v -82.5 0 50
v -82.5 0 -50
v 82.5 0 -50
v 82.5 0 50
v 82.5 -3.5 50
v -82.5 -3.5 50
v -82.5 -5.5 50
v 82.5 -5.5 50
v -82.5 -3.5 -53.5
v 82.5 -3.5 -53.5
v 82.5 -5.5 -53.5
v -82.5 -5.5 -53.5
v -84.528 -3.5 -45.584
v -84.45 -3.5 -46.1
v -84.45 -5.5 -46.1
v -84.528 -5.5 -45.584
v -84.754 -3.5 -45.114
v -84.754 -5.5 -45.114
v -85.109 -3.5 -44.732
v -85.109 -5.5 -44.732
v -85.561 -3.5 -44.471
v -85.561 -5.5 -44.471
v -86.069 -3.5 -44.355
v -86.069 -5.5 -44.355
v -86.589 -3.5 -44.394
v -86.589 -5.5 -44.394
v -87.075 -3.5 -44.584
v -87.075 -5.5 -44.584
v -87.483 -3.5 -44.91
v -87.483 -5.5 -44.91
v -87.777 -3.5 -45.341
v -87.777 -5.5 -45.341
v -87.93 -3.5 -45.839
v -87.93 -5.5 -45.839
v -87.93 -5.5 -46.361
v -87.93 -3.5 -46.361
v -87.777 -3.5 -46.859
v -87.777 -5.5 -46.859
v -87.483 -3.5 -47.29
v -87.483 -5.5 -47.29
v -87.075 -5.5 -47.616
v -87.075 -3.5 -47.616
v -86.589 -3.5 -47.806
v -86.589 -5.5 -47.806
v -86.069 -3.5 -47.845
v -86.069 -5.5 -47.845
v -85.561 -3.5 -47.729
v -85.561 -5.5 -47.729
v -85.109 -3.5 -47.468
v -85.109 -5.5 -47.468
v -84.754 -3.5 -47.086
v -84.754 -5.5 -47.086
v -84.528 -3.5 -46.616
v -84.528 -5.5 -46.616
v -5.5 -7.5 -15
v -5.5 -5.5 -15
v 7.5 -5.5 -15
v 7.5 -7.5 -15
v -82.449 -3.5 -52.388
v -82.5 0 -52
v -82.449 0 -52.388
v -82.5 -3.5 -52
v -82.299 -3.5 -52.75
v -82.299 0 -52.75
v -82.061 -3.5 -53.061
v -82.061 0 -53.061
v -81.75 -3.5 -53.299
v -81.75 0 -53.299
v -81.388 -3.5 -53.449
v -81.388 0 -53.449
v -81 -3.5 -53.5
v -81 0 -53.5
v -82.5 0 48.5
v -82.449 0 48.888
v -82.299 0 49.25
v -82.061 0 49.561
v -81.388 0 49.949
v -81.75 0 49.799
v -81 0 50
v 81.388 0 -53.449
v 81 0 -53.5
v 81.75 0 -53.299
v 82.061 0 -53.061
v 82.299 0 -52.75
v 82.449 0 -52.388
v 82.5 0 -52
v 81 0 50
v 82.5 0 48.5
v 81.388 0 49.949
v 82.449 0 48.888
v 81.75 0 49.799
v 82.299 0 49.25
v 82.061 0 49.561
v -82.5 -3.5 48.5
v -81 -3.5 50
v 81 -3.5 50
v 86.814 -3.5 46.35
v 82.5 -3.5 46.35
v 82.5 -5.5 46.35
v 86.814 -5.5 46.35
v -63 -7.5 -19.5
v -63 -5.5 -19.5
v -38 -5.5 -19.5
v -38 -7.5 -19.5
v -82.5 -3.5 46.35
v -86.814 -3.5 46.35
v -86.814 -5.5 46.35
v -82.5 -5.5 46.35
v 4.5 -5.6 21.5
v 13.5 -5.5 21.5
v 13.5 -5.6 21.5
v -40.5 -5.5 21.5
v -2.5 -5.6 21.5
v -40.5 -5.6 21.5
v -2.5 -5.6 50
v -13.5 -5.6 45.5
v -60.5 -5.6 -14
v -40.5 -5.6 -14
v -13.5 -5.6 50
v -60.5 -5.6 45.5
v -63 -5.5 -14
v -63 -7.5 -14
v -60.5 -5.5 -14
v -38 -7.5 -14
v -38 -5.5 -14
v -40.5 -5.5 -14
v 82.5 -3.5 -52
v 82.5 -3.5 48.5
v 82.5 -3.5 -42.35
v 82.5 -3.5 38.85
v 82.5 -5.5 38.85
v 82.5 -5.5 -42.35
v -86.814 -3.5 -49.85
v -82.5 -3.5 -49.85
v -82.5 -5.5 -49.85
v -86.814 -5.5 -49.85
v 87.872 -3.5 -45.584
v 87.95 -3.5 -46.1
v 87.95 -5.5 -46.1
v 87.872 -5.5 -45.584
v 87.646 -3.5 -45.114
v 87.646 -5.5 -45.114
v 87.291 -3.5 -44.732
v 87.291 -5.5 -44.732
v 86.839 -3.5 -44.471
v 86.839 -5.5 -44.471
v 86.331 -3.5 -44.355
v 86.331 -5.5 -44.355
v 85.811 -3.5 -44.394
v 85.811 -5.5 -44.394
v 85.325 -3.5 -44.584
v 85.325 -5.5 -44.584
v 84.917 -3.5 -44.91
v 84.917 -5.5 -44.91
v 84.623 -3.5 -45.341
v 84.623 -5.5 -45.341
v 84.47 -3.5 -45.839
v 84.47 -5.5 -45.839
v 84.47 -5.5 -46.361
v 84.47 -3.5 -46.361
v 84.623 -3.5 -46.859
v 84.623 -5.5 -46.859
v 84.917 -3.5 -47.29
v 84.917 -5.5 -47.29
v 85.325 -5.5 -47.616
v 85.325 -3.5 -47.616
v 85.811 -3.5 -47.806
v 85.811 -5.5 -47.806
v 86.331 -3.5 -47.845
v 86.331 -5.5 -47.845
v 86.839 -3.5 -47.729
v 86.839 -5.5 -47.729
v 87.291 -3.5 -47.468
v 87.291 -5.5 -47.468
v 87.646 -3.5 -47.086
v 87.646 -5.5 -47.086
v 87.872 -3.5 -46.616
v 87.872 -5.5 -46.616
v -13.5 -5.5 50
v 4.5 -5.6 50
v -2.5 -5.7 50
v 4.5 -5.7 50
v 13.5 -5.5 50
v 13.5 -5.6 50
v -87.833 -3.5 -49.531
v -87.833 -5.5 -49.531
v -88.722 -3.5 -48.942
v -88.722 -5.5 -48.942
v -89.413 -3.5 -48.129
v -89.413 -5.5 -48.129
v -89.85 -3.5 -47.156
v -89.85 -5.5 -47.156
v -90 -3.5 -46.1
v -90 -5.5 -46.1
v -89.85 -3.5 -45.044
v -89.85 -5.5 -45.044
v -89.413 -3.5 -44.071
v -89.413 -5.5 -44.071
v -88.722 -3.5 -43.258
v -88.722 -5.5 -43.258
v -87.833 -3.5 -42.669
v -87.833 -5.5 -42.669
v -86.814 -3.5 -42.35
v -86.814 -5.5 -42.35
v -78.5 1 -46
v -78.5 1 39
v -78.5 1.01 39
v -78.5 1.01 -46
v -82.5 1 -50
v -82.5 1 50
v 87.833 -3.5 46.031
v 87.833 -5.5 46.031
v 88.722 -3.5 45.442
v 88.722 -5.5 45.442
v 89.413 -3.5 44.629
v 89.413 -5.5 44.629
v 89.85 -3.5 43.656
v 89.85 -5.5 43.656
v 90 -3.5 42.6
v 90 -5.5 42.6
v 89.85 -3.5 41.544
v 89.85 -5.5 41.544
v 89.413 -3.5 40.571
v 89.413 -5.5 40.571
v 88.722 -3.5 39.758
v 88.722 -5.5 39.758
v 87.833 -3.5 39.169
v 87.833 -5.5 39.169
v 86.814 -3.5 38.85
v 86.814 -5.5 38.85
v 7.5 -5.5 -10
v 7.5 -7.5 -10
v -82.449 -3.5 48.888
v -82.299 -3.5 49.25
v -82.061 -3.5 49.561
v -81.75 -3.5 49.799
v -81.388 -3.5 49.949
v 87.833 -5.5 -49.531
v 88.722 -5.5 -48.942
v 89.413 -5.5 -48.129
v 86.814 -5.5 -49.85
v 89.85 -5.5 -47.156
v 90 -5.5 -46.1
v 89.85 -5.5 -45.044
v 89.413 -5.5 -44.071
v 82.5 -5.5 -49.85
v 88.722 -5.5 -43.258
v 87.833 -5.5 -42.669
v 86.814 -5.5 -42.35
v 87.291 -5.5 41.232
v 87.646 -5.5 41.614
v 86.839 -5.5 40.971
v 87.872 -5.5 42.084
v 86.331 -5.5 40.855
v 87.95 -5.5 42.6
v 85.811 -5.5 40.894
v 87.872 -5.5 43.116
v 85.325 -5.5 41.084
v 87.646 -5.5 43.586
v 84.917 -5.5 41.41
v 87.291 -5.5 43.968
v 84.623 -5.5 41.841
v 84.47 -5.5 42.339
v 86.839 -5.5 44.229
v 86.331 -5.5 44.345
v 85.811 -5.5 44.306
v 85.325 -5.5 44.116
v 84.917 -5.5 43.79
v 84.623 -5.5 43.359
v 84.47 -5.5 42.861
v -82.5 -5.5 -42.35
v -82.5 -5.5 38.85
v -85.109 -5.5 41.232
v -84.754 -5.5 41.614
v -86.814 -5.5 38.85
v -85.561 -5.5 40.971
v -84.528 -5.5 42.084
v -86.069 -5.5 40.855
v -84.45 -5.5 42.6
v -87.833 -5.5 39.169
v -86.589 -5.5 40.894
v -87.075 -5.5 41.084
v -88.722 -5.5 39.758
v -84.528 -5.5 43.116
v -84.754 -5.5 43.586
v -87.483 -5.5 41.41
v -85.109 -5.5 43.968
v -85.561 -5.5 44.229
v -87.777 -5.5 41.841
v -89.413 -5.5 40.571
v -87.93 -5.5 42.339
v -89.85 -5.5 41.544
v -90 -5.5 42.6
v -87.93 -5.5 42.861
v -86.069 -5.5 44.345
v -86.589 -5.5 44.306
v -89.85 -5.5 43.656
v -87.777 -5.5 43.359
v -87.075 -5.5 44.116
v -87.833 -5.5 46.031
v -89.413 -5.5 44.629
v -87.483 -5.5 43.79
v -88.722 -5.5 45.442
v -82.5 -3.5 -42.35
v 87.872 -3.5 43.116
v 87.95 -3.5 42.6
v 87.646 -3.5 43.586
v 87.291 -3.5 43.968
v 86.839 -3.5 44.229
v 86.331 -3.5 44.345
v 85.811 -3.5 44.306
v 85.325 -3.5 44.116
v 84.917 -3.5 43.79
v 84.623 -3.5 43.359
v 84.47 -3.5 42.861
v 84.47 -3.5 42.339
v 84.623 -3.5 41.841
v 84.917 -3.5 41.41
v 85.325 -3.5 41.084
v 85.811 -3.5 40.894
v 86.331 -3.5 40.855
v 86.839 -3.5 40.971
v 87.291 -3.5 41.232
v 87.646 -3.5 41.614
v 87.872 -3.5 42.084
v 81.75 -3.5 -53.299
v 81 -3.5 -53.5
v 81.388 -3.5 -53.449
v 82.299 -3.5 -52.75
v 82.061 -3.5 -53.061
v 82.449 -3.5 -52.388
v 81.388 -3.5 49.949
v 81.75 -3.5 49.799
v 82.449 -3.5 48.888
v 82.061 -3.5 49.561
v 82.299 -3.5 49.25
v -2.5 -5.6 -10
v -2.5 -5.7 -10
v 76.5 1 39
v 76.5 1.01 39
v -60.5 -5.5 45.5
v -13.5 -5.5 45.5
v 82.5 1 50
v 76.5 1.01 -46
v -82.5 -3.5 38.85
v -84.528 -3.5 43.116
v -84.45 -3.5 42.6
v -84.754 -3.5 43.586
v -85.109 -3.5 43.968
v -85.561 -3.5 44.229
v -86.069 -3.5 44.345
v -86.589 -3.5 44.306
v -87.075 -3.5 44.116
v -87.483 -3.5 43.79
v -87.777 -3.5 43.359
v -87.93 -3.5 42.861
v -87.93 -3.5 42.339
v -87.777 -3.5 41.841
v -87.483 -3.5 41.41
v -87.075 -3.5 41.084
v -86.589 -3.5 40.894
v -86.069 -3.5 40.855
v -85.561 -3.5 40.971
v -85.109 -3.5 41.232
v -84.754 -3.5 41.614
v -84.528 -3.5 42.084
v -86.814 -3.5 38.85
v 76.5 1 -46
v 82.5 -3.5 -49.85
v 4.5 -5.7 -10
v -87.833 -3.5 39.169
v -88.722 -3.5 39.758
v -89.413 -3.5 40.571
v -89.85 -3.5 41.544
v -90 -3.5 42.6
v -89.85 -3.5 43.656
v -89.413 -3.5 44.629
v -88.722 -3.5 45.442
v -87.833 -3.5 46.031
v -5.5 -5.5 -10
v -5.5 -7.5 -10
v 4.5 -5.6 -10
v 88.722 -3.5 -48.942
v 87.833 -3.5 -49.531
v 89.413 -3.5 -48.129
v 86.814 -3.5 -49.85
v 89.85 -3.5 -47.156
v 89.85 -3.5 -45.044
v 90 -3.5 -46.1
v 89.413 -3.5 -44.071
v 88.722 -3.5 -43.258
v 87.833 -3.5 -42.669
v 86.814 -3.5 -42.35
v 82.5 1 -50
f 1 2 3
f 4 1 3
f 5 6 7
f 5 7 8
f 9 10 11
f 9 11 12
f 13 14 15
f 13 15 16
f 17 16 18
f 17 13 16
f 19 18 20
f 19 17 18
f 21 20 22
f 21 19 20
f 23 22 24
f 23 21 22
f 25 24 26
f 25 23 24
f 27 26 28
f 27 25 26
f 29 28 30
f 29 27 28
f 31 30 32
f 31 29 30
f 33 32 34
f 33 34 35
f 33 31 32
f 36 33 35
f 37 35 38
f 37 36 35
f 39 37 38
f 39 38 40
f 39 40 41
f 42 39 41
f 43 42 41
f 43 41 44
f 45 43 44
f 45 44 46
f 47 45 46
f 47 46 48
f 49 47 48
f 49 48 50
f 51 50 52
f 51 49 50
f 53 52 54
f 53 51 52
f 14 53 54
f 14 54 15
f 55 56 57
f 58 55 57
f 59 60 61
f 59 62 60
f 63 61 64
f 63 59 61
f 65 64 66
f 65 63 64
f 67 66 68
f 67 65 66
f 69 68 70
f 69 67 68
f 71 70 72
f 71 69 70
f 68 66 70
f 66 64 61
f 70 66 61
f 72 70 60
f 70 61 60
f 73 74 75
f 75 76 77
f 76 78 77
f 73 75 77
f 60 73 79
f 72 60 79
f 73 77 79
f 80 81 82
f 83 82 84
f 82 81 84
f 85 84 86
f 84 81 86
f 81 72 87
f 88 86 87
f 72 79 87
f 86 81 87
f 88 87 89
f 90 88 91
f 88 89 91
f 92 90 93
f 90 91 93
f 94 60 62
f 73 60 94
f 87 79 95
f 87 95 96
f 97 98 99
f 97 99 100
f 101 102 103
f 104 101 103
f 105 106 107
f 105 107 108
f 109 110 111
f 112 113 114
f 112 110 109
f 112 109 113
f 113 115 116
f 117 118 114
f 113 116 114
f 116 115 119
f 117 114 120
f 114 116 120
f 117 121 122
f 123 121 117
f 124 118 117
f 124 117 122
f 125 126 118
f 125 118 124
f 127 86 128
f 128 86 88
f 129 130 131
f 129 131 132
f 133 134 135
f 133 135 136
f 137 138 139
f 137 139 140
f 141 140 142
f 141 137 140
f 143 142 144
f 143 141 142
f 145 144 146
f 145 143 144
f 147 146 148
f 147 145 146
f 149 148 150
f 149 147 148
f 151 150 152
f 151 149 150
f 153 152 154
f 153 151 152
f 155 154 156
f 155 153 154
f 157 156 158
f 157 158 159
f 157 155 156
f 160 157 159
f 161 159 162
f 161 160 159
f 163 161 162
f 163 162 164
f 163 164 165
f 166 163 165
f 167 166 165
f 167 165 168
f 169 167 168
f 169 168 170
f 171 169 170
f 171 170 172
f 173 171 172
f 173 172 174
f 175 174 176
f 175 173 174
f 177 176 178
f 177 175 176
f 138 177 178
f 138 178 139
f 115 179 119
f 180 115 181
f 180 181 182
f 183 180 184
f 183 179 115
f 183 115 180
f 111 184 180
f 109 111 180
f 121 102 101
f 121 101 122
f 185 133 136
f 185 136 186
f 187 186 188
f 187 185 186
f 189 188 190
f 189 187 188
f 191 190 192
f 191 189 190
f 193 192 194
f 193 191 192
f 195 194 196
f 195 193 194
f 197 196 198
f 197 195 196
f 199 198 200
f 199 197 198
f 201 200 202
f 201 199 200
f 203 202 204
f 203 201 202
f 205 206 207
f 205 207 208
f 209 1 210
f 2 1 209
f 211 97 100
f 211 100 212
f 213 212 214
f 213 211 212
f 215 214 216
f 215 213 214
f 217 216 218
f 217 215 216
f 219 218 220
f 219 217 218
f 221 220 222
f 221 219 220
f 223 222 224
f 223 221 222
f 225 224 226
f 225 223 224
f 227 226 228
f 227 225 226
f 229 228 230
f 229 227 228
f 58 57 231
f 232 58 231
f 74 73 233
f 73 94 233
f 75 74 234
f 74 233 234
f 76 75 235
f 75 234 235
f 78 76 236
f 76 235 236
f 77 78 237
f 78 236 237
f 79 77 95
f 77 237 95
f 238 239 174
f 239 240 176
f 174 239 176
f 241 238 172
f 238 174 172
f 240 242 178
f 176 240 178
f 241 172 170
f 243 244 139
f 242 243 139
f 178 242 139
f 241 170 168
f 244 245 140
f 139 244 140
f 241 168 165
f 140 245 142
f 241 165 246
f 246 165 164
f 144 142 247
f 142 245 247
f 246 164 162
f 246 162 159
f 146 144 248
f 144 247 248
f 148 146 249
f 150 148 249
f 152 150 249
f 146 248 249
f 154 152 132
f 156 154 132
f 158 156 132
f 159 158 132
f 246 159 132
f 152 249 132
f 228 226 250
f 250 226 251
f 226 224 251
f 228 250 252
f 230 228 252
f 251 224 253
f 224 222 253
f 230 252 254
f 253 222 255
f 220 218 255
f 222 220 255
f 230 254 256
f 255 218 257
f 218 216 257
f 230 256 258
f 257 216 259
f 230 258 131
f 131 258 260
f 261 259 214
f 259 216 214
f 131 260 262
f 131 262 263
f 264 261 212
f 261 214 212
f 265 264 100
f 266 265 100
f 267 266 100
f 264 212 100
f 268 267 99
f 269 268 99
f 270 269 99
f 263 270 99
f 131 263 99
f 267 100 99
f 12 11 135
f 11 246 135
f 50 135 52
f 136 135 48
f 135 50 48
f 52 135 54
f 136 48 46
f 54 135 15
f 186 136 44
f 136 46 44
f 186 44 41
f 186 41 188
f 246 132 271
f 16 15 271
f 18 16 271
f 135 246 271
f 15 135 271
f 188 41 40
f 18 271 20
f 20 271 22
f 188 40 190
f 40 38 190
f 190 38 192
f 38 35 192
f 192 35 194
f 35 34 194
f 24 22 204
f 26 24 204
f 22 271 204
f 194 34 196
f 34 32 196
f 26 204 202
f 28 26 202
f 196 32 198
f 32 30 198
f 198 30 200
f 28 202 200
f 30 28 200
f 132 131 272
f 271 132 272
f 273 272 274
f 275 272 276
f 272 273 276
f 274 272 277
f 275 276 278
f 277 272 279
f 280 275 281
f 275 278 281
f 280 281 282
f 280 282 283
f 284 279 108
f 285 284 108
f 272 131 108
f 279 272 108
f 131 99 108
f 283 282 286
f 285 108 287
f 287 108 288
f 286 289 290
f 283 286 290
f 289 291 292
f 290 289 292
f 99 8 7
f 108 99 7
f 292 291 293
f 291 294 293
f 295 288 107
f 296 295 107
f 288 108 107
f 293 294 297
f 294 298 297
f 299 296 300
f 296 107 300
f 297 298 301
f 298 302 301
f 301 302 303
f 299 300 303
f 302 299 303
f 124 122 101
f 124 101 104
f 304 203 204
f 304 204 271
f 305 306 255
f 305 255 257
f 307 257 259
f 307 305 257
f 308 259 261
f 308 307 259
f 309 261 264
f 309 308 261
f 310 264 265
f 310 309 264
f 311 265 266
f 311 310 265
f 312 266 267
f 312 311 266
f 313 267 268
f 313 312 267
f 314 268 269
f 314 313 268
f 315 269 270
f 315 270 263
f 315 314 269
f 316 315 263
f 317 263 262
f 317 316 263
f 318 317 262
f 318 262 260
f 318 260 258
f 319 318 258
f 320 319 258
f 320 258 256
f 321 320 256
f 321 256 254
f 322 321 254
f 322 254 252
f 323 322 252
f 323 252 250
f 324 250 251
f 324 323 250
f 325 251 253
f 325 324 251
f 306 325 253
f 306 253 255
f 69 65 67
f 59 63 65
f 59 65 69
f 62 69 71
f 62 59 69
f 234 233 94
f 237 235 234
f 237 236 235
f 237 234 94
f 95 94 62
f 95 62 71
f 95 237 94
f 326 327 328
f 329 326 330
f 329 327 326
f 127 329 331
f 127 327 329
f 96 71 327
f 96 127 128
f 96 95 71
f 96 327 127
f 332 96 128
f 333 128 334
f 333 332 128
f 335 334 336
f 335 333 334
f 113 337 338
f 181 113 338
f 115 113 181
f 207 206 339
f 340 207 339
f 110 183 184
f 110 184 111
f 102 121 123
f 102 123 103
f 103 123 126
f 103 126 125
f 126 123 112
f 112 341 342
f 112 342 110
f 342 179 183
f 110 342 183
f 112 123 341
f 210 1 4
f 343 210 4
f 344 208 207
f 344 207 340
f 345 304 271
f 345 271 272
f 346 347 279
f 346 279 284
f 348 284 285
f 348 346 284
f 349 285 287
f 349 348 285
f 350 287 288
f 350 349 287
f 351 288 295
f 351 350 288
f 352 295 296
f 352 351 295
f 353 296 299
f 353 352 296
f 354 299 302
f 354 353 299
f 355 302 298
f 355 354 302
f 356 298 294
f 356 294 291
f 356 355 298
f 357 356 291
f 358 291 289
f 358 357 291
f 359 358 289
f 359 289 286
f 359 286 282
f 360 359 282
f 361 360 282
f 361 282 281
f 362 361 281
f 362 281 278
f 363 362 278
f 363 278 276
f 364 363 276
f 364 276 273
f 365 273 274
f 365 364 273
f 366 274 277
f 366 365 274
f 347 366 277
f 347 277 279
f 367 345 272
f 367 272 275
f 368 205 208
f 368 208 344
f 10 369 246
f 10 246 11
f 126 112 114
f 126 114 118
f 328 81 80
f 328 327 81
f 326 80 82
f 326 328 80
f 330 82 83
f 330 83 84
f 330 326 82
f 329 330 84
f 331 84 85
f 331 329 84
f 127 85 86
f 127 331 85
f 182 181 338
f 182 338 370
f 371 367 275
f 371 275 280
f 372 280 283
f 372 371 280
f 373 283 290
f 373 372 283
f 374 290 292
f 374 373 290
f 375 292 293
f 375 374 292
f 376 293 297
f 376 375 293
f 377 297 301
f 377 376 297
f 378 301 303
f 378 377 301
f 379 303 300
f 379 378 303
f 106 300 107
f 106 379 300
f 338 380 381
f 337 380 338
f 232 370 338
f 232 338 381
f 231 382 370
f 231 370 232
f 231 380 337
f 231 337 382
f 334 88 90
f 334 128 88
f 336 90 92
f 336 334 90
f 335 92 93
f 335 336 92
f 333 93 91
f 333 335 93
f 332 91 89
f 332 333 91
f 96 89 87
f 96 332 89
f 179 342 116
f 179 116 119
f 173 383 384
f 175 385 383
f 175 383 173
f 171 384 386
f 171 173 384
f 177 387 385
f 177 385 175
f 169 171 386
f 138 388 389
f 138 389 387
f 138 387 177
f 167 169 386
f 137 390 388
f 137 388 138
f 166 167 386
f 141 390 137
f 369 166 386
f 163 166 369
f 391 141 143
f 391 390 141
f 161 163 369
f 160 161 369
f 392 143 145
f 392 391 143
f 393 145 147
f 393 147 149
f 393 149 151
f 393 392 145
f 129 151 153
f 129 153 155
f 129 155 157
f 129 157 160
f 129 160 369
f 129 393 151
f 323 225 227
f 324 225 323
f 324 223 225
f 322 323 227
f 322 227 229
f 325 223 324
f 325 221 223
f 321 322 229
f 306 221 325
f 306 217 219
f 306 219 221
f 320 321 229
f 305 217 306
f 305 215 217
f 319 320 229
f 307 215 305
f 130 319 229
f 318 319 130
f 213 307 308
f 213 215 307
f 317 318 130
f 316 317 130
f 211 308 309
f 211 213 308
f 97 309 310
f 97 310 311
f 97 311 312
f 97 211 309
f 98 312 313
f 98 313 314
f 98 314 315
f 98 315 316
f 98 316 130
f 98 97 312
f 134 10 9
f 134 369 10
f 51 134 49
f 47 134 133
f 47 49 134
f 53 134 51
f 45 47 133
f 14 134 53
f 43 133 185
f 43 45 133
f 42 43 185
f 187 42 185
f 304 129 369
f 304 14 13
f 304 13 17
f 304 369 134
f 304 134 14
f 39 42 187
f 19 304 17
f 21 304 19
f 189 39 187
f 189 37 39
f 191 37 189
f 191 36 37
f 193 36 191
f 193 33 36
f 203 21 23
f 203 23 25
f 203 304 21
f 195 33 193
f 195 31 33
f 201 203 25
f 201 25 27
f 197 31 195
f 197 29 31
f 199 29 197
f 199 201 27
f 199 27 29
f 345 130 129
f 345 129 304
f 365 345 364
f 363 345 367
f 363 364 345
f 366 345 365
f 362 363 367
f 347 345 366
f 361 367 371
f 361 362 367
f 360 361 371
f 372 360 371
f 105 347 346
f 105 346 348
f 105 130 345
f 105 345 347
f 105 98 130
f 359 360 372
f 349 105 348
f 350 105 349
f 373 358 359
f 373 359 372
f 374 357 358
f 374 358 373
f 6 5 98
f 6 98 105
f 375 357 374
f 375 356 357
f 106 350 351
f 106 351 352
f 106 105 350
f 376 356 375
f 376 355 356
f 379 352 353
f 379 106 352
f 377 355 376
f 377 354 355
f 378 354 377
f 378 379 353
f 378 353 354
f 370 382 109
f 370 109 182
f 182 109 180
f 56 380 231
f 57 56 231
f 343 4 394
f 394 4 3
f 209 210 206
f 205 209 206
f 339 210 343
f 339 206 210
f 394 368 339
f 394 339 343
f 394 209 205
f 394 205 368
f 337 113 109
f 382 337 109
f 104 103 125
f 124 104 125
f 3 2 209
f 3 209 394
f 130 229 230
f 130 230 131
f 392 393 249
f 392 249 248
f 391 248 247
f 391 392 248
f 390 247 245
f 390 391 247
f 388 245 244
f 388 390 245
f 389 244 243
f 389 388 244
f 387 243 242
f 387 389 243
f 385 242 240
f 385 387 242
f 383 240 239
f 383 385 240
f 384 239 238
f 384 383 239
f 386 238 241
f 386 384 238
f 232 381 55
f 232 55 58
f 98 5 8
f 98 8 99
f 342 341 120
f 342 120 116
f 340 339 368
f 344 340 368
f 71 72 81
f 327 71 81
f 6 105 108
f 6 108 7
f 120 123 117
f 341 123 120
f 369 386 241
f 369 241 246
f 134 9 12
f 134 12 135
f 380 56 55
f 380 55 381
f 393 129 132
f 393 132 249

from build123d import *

# Parameters (mm, degrees)
ESQUISSE1_W        = 165
ESQUISSE1_H        = 100
BOSS_EXTRU_1_DEPTH = 1
ESQUISSE3_W        = 165
ESQUISSE3_H        = 103.5
BOSS_EXTRU_2_DEPTH = 3.5
CONG_1_R           = 1.5
ESQUISSE4_R        = 1.75
BOSS_EXTRU_3_DEPTH = 2
BOSS_EXTRU_4_DEPTH = 0.1
ESQUISSE7_W        = 25
ESQUISSE7_H        = 5.5
BOSS_EXTRU_5_DEPTH = 2
ESQUISSE9_W        = 7
ESQUISSE9_H        = 60
BOSS_EXTRU_6_DEPTH = 0.1
ESQUISSE10_W       = 13
ESQUISSE10_H       = 5
BOSS_EXTRU_8_DEPTH = 2
ESQUISSE11_W       = 155
ESQUISSE11_H       = 85
BOSS_EXTRU_9_DEPTH = 0.01


with BuildPart() as part:
    # Esquisse1 → Boss.-Extru.1 (new body)
    with BuildSketch(Plane(origin=(0, 0, 0), x_dir=(1, 0, 0), z_dir=(0, 1, 0))):
        Rectangle(ESQUISSE1_W, ESQUISSE1_H)
    extrude(amount=BOSS_EXTRU_1_DEPTH)

    # Esquisse11 → Boss.-Extru.9 (add)
    with BuildSketch(Plane(origin=(0, 1, 0), x_dir=(1, 0, 0), z_dir=(0, 1, 0))):
        with Locations((-1, 3.5)):
            Rectangle(ESQUISSE11_W, ESQUISSE11_H)
    extrude(amount=BOSS_EXTRU_9_DEPTH)


with BuildPart() as body_2:
    # Esquisse3 → Boss.-Extru.2 (new body)
    with BuildSketch(Plane.XZ):
        with Locations((0, -1.75)):
            Rectangle(ESQUISSE3_W, ESQUISSE3_H)
    extrude(amount=BOSS_EXTRU_2_DEPTH)

    # Congé1
    cong_1_edges = [body_2.edges().sort_by_distance(p)[0] for p in [
        (-82.5, -1.75, 50),
        (82.5, -1.75, 50),
        (82.5, -1.75, -53.5),
        (-82.5, -1.75, -53.5),
    ]]
    fillet(cong_1_edges, radius=CONG_1_R)


with BuildPart() as body_3:
    # Esquisse4 → Boss.-Extru.3 (new body)
    with BuildSketch(Plane.XZ.offset(3.5)):
        with BuildLine():
            Line((82.5, -53.5), (-82.5, -53.5))
            Line((-82.5, -53.5), (-82.5, -49.85))
            Line((-82.5, -49.85), (-86.814410286, -49.85))
            ThreePointArc((-86.814410286, -49.85), (-90, -46.1), (-86.814410286, -42.35))
            Line((-86.814410286, -42.35), (-82.5, -42.35))
            Line((-82.5, -42.35), (-82.5, 38.85))
            Line((-82.5, 38.85), (-86.814410286, 38.85))
            ThreePointArc((-86.814410286, 38.85), (-90, 42.6), (-86.814410286, 46.35))
            Line((-86.814410286, 46.35), (-82.5, 46.35))
            Line((-82.5, 46.35), (-82.5, 50))
            Line((-82.5, 50), (82.5, 50))
            Line((82.5, 50), (82.5, 46.35))
            Line((82.5, 46.35), (86.814410286, 46.35))
            ThreePointArc((86.814410286, 46.35), (90, 42.6), (86.814410286, 38.85))
            Line((86.814410286, 38.85), (82.5, 38.85))
            Line((82.5, 38.85), (82.5, -42.35))
            Line((82.5, -42.35), (86.814410286, -42.35))
            ThreePointArc((86.814410286, -42.35), (90, -46.1), (86.814410286, -49.85))
            Line((86.814410286, -49.85), (82.5, -49.85))
            Line((82.5, -49.85), (82.5, -53.5))
        make_face()
        with Locations((86.2, 42.6)):
            Circle(ESQUISSE4_R, mode=Mode.SUBTRACT)
        with Locations((-86.2, 42.6)):
            Circle(ESQUISSE4_R, mode=Mode.SUBTRACT)
        with Locations((-86.2, -46.1)):
            Circle(ESQUISSE4_R, mode=Mode.SUBTRACT)
        with Locations((86.2, -46.1)):
            Circle(ESQUISSE4_R, mode=Mode.SUBTRACT)
    extrude(amount=BOSS_EXTRU_3_DEPTH)


with BuildPart() as body_4:
    # Esquisse6 → Boss.-Extru.4 (new body)
    with BuildSketch(Plane.XZ.offset(5.5)):
        Polygon((13.5, 50), (13.5, 21.5), (-40.5, 21.5), (-40.5, -14), (-60.5, -14), (-60.5, 45.5), (-13.5, 45.5), (-13.5, 50), align=None)
    extrude(amount=BOSS_EXTRU_4_DEPTH)

    # Esquisse7 → Boss.-Extru.5 (add)
    with BuildSketch(Plane.XZ.offset(5.5)):
        with Locations((-50.5, -16.75)):
            Rectangle(ESQUISSE7_W, ESQUISSE7_H)
    extrude(amount=BOSS_EXTRU_5_DEPTH)

    # Esquisse9 → Boss.-Extru.6 (add)
    with BuildSketch(Plane.XZ.offset(5.6)):
        with Locations((1, 20)):
            Rectangle(ESQUISSE9_W, ESQUISSE9_H)
    extrude(amount=BOSS_EXTRU_6_DEPTH)

    # Esquisse10 → Boss.-Extru.8 (add)
    with BuildSketch(Plane.XZ.offset(5.5)):
        with Locations((1, -12.5)):
            Rectangle(ESQUISSE10_W, ESQUISSE10_H)
    extrude(amount=BOSS_EXTRU_8_DEPTH)


solid = Compound([part.part, body_2.part, body_3.part, body_4.part])
